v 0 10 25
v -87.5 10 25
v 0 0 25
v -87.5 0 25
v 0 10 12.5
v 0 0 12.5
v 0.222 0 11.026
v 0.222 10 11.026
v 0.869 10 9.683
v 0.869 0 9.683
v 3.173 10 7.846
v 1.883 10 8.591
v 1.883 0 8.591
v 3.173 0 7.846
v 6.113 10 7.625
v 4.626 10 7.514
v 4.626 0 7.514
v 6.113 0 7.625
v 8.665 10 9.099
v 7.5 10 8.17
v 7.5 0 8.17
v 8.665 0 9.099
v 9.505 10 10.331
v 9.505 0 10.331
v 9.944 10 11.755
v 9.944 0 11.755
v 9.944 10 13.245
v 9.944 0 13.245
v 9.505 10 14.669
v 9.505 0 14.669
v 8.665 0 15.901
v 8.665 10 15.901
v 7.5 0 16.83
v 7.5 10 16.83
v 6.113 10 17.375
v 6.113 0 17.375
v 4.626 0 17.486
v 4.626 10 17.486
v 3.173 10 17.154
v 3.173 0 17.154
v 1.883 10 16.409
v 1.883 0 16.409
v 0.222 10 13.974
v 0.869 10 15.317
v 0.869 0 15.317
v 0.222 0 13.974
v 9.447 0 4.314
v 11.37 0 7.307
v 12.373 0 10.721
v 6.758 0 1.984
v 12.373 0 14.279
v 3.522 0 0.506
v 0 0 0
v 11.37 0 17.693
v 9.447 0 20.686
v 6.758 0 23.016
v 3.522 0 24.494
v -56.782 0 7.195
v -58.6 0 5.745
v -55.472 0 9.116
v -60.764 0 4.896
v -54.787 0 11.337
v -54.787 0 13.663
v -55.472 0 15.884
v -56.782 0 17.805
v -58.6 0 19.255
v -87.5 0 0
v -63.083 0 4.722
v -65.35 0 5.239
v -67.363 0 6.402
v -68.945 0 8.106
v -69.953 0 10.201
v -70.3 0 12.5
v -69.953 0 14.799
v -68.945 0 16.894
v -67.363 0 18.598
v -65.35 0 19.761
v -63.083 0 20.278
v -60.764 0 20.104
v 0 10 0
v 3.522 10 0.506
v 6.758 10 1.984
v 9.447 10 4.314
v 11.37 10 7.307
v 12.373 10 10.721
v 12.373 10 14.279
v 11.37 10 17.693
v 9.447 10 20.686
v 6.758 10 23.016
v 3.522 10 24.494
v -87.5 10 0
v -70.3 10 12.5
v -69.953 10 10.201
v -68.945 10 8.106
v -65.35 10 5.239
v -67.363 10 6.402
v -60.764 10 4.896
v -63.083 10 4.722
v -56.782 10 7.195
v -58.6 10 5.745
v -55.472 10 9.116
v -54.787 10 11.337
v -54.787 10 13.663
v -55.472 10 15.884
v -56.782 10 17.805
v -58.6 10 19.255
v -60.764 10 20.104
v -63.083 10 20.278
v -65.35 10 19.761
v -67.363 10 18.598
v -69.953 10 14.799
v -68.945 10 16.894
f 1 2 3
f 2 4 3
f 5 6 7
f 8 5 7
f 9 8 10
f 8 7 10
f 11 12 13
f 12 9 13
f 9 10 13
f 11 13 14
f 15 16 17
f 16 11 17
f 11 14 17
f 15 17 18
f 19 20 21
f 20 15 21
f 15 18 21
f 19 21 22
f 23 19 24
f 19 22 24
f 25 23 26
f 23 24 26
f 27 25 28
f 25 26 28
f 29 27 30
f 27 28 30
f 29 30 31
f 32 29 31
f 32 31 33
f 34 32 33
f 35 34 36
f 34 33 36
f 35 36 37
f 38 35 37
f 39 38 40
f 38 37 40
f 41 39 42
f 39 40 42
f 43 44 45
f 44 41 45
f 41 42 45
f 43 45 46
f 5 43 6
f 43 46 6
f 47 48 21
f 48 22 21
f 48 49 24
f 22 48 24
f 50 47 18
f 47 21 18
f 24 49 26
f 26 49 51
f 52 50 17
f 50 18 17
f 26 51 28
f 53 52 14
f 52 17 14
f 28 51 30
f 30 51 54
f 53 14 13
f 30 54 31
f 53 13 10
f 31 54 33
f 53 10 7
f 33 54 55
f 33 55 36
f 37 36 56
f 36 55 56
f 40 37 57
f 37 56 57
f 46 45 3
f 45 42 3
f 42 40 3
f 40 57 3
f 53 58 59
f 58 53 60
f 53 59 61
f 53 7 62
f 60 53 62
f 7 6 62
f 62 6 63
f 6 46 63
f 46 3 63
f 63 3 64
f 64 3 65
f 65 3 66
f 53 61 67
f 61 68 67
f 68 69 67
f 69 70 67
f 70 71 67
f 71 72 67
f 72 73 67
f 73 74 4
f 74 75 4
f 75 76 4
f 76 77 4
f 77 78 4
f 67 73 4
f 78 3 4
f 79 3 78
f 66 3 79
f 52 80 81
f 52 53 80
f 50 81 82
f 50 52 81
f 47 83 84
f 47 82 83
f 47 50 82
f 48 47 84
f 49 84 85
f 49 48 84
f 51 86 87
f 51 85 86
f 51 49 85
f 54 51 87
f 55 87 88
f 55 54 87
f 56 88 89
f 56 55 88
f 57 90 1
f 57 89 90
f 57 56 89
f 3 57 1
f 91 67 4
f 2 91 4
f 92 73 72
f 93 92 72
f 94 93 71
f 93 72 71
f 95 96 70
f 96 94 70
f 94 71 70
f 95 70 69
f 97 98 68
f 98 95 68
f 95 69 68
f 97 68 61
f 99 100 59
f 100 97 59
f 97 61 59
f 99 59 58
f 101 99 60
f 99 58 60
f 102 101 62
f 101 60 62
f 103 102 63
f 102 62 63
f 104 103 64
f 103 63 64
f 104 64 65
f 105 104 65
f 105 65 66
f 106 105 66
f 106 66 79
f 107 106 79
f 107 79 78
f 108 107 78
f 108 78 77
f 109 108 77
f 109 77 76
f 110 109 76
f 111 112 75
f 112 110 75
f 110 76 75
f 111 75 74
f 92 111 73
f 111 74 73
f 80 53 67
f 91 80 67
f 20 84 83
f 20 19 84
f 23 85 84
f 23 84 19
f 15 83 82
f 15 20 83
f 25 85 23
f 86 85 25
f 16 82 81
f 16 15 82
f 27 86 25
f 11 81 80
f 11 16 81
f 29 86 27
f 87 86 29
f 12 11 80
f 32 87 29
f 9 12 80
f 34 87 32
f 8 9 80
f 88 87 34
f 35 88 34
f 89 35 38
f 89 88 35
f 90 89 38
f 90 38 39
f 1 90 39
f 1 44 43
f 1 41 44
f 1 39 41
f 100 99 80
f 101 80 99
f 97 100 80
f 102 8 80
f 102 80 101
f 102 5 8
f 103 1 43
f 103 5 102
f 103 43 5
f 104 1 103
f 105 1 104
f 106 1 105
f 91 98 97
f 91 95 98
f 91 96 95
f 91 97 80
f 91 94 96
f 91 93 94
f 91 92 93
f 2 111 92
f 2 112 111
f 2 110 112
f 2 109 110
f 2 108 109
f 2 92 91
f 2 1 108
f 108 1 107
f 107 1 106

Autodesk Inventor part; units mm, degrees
ref_plane "YZ Plane" through (0, 0, 0) normal (1, 0, 0) x (0, 1, 0)
ref_plane "XZ Plane" through (0, 0, 0) normal (0, 1, 0) x (-1, 0, 0)
ref_plane "XY Plane" through (0, 0, 0) normal (0, 0, 1) x (1, 0, 0)
sketch "Sketch1" plane through (0, 0, 0) normal (0, 1, 0) x (-1, 0, 0)
  line L0 (0, 0) -> (87.5, 0)
  line L1 (87.5, 0) -> (87.5, 25)
  line L2 (87.5, 25) -> (0, 25)
  circle A0 centre (62.5, 12.5) radius 7.8
  arc A1 (0, 25) -> (0, 0) centre (0, 12.5) ccw
  circle A2 centre (-5, 12.5) radius 5
extrude "Extrusion1" add sketch "Sketch1" along normal blind 10
properties part number "handle_crank" material "Plywood, Finish"
